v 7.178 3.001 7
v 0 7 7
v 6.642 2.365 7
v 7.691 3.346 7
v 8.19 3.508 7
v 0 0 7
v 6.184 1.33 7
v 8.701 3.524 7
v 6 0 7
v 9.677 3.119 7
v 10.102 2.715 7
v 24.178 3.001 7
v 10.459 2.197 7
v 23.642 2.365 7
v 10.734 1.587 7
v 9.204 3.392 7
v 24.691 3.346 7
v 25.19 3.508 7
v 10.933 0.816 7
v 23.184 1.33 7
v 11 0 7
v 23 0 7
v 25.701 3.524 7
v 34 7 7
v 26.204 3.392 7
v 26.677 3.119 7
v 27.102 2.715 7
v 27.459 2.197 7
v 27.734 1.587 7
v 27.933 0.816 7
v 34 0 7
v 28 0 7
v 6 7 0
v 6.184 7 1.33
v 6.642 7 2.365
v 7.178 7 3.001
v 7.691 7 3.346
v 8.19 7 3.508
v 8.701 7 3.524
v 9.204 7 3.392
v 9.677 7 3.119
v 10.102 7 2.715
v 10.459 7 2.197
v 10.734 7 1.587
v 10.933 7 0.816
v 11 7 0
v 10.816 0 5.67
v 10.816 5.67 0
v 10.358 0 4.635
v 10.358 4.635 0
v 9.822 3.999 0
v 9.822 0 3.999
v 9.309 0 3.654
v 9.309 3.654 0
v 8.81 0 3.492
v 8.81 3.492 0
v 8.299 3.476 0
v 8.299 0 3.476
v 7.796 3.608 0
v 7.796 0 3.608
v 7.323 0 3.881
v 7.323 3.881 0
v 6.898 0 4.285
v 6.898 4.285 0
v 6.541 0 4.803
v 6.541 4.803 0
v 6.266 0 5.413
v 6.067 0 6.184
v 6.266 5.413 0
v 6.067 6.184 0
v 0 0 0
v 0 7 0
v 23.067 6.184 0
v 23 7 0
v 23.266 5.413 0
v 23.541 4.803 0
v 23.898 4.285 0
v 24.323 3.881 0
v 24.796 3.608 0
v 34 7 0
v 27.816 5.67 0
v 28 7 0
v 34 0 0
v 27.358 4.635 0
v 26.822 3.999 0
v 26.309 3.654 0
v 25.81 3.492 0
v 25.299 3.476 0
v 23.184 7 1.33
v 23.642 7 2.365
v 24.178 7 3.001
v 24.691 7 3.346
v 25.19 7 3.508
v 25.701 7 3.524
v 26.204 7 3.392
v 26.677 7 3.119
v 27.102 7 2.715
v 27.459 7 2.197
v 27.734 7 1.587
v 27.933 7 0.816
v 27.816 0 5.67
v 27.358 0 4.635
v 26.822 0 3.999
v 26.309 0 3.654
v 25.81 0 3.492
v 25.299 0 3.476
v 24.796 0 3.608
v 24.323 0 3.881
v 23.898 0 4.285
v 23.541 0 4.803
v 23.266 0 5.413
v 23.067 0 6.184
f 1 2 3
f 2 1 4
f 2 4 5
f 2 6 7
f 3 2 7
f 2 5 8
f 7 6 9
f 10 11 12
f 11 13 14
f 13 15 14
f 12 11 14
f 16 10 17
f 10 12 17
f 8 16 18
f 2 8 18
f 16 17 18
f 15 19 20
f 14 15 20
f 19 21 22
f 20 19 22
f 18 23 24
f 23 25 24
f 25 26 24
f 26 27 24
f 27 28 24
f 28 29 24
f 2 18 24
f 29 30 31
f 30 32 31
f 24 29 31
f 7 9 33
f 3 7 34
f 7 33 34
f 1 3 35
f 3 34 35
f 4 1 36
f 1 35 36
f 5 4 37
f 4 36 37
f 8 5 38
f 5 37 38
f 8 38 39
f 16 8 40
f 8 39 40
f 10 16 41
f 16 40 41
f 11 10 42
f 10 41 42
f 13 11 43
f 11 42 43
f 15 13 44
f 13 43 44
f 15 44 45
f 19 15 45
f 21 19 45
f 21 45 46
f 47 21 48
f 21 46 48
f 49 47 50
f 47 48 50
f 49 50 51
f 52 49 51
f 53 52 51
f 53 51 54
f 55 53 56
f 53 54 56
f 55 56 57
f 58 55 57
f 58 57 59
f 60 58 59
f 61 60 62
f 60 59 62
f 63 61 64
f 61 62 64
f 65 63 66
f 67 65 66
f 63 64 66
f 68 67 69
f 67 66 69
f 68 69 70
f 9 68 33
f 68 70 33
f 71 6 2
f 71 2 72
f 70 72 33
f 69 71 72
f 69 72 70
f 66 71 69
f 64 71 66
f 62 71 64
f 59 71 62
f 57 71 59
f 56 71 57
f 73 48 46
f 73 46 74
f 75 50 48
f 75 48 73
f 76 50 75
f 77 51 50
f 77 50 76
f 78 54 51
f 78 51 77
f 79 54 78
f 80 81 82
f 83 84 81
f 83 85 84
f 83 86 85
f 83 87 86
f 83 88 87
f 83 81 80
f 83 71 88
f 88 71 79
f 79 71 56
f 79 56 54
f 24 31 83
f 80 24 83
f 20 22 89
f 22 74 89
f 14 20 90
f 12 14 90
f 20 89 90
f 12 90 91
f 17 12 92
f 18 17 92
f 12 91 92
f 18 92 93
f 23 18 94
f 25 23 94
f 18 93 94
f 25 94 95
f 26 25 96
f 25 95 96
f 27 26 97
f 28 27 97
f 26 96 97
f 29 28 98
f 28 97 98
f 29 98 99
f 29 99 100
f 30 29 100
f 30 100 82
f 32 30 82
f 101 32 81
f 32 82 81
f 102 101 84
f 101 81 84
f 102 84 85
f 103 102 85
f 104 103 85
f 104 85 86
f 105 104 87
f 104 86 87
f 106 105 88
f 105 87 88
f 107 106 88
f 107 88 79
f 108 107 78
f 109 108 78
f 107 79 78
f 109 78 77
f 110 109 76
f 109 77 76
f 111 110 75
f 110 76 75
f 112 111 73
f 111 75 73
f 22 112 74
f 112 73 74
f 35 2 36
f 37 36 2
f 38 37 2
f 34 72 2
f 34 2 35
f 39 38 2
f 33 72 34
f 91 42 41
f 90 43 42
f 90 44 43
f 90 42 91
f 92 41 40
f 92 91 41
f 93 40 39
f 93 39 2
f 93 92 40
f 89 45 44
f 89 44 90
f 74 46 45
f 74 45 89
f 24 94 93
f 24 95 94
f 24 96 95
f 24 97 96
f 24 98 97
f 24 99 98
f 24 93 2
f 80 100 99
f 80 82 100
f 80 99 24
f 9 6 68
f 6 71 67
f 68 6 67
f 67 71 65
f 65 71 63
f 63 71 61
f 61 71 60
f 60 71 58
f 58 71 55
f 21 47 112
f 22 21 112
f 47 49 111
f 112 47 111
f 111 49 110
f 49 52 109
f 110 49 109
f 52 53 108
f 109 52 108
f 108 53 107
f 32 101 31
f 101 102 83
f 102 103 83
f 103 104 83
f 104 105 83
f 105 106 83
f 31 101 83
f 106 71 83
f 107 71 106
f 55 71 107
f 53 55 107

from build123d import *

# Parameters (mm, degrees)
SKETCH1_W               = 34
SKETCH1_H               = 7
BOSS_EXTRUDE1_DEPTH     = 7
SKETCH6_OUTSIDE_W       = 43.082
SKETCH6_OUTSIDE_H       = 18.981
SKETCH6_OUTSIDE_W_2     = 34
SKETCH6_OUTSIDE_H_2     = 9.899494937
SKETCH6_OUTSIDE_R       = 2.5
CUT_EXTRUDE2_DEPTH      = 5.949747468
CUT_EXTRUDE2_DEPTH_BACK = 5.949747468


with BuildPart() as part:
    # sketch1 → Boss-Extrude1 (new body)
    with BuildSketch(Plane(origin=(0, 0, 0), x_dir=(1, 0, 0), z_dir=(0, 1, 0))):
        with Locations((17, -3.5)):
            Rectangle(SKETCH1_W, SKETCH1_H)
    extrude(amount=BOSS_EXTRUDE1_DEPTH)

    # Sketch6 outside → Cut-Extrude2 (cut, two sides)
    with BuildSketch(Plane(origin=(0, 0, 0), x_dir=(-1, 0, 0), z_dir=(0, 0.707106781, -0.707106781))) as cut_extrude2_sk:
        with Locations((-17, 4.9495)):
            Rectangle(SKETCH6_OUTSIDE_W, SKETCH6_OUTSIDE_H)
        with Locations((-17, 4.949747469)):
            Rectangle(SKETCH6_OUTSIDE_W_2, SKETCH6_OUTSIDE_H_2, mode=Mode.SUBTRACT)
        with Locations((-25.5, 4.949747468)):
            Circle(SKETCH6_OUTSIDE_R)
        with Locations((-8.5, 4.949747468)):
            Circle(SKETCH6_OUTSIDE_R)
    extrude(amount=CUT_EXTRUDE2_DEPTH, mode=Mode.SUBTRACT)
    extrude(cut_extrude2_sk.sketch, amount=-CUT_EXTRUDE2_DEPTH_BACK, mode=Mode.SUBTRACT)


solid = part.part
